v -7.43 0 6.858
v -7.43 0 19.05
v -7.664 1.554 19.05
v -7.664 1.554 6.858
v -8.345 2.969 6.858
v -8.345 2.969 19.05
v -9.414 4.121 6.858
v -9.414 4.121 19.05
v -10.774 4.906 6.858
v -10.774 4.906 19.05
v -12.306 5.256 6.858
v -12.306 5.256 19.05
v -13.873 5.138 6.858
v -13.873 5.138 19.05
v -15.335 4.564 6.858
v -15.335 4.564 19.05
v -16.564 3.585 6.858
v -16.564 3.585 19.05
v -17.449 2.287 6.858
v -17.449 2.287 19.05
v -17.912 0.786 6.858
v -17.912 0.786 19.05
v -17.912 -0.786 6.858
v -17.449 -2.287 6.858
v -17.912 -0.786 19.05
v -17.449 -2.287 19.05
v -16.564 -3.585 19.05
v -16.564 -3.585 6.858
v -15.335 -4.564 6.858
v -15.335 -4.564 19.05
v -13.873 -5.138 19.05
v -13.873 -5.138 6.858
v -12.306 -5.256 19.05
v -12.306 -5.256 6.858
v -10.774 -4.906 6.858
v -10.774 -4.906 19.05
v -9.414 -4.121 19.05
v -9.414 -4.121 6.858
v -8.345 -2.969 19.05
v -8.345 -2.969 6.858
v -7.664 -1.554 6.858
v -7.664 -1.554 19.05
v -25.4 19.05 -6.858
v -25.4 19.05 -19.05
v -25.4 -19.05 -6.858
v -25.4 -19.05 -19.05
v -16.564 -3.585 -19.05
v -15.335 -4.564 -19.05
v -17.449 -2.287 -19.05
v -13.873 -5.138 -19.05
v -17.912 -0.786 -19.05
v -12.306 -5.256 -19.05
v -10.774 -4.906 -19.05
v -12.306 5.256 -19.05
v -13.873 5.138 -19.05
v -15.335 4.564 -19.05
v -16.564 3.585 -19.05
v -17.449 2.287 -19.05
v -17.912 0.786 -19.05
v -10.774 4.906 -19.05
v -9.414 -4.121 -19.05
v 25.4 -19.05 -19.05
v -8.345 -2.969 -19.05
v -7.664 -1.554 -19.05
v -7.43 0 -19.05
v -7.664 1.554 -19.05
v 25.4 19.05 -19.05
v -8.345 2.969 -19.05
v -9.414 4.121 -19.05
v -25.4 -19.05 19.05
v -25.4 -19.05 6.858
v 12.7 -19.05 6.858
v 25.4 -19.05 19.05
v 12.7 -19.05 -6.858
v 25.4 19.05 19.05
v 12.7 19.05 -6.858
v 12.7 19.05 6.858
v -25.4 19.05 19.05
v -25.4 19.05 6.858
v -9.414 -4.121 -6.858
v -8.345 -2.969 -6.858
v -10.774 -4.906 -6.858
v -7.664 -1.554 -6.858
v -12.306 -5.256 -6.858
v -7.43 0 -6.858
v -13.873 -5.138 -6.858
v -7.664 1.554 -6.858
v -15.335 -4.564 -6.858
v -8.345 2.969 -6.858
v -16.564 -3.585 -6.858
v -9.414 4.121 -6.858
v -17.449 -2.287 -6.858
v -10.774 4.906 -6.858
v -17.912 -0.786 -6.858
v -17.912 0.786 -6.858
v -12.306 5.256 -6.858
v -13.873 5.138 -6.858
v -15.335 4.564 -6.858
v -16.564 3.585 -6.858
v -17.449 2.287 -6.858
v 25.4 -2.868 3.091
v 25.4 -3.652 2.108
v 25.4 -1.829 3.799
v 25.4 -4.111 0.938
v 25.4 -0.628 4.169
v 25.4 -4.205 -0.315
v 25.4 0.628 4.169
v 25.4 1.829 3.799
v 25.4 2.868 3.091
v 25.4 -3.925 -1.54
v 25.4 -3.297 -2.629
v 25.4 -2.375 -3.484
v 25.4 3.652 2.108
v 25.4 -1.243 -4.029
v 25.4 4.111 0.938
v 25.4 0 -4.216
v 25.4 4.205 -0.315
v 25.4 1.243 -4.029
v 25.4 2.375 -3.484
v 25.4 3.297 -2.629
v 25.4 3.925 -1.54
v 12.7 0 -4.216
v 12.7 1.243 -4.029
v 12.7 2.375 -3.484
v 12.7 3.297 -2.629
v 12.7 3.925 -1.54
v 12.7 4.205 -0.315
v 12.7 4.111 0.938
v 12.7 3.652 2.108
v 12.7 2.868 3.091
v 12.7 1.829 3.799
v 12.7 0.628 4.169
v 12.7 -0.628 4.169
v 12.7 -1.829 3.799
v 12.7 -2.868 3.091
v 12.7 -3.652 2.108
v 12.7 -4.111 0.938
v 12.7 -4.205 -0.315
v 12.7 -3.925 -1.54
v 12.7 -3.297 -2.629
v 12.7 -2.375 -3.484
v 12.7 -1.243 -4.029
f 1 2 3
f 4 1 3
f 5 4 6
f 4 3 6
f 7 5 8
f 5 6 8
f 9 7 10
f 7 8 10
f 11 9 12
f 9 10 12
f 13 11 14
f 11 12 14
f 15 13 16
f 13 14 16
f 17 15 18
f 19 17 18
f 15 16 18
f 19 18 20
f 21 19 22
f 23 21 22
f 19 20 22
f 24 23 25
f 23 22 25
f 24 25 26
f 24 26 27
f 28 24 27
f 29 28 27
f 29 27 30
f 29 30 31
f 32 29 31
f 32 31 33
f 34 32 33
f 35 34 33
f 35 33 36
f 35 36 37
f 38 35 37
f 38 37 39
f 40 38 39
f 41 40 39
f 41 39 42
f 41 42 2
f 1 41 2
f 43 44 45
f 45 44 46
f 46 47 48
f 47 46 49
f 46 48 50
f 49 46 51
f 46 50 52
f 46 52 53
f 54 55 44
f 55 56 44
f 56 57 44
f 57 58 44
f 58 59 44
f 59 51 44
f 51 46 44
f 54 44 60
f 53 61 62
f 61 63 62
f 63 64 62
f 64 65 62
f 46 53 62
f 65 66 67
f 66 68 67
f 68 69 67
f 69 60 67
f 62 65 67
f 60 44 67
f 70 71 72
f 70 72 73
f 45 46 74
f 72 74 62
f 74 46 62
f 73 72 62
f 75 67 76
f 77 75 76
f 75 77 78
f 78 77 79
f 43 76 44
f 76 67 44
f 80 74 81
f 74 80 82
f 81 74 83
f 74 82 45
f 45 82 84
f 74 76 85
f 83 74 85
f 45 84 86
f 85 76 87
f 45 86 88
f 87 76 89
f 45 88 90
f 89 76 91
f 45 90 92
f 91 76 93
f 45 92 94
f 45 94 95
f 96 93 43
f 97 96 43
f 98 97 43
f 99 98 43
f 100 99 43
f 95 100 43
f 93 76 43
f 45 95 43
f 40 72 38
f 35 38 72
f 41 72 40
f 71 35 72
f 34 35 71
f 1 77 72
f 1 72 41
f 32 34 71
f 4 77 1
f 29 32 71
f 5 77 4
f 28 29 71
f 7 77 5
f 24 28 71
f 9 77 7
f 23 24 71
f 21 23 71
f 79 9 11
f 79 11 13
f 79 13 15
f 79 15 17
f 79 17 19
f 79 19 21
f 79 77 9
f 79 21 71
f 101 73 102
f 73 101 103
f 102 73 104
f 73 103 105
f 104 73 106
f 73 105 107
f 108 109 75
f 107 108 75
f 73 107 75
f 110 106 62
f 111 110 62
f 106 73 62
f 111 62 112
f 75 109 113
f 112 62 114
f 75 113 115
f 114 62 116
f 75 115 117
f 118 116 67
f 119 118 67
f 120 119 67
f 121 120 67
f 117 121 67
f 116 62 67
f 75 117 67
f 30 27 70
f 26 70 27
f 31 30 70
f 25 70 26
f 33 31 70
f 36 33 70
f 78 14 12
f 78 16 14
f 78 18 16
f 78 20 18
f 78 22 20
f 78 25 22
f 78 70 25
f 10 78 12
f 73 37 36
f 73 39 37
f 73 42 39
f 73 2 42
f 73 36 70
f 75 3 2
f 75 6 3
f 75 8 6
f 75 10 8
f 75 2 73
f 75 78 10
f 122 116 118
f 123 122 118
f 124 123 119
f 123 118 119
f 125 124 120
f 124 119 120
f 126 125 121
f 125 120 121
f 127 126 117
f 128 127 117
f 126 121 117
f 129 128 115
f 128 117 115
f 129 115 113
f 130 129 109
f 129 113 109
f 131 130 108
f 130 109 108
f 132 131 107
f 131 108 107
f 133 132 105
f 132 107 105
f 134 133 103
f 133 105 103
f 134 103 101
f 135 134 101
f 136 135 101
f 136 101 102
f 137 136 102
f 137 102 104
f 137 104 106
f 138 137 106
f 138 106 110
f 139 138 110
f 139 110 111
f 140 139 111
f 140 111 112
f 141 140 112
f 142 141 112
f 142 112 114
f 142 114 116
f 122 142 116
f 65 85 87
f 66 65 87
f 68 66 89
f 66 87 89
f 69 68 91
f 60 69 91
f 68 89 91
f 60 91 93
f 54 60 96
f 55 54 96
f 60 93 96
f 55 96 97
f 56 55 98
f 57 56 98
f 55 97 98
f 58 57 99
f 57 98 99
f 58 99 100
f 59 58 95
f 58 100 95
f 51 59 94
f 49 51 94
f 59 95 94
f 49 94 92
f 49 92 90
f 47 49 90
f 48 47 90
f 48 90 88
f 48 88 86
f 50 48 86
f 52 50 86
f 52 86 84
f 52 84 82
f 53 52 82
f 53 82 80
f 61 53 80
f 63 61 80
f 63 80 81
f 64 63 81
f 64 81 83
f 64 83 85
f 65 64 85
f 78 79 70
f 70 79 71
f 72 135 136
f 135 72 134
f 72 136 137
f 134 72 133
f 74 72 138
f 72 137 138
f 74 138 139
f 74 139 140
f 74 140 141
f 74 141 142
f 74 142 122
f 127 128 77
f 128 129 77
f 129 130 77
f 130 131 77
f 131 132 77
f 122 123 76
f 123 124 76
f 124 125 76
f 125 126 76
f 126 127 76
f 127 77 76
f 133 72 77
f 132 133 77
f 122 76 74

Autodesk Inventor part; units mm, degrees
ref_plane "YZ Plane" through (0, 0, 0) normal (1, 0, 0) x (0, 1, 0)
sketch "Sketch2" plane through (0, 0, 0) normal (0, 0, 1) x (1, 0, 0)
  line L0 (-25.4, -19.05) -> (25.4, -19.05)
  line L1 (25.4, -19.05) -> (25.4, 19.05)
  line L2 (25.4, 19.05) -> (-25.4, 19.05)
  line L3 (-25.4, 19.05) -> (-25.4, -19.05)
  line L4 (-25.4, -19.05) -> (25.4, 19.05) construction
  line L5 (25.4, -19.05) -> (-25.4, 19.05) construction
  point P0 (0, 0)
  dimension "d4" = 50.8
  dimension "d5" = 38.1
extrude "Extrusion2" add sketch "Sketch2" along normal mid plane 38.1
sketch "Sketch3" plane through (-25.4, 19.05, 19.05) normal (0, 1, 0) x (1, 0, 0)
  line L0 (0, 0) -> (0, 38.1) construction
  line L1 (38.1, 19.05) -> (38.1, 25.908)
  line L2 (38.1, 25.908) -> (0, 25.908)
  line L3 (0, 25.908) -> (0, 19.05)
  line L4 (0, 0) -> (0, 25.4) construction
  line L5 (38.1, 19.05) -> (38.1, 12.192)
  line L6 (38.1, 12.192) -> (0, 12.192)
  line L7 (0, 12.192) -> (0, 19.05)
  line L8 (50.8, 0) -> (0, 0) projected
  point P0 (25.4, 19.05)
  dimension "d8" = 38.1
  dimension "d10" = 13.716
  dimension "d34" = 12.192
extrude "Extrusion3" cut sketch "Sketch3" against normal through all
sketch "Sketch4" plane through (0, 0, 19.05) normal (0, 0, 1) x (1, 0, 0)
  circle A0 centre (-12.7, 0) radius 5.2705
  line L0 (-25.4, 19.05) -> (-25.4, -19.05) projected
  point P0 (0, 0)
  dimension "d13" = 10.541
  dimension "d14" = 12.7
extrude "Extrusion4" cut sketch "Sketch4" against normal through all
sketch "Sketch5" plane through (25.4, -19.05, 19.05) normal (1, 0, 0) x (0, 0, -1)
  circle A0 centre (19.05, 19.05) radius 4.2164
  dimension "d27" = 8.4328
extrude "Extrusion5" cut sketch "Sketch5" against normal blind 12.7
properties part number "pistonFor-8-in" material "PET Plastic"
